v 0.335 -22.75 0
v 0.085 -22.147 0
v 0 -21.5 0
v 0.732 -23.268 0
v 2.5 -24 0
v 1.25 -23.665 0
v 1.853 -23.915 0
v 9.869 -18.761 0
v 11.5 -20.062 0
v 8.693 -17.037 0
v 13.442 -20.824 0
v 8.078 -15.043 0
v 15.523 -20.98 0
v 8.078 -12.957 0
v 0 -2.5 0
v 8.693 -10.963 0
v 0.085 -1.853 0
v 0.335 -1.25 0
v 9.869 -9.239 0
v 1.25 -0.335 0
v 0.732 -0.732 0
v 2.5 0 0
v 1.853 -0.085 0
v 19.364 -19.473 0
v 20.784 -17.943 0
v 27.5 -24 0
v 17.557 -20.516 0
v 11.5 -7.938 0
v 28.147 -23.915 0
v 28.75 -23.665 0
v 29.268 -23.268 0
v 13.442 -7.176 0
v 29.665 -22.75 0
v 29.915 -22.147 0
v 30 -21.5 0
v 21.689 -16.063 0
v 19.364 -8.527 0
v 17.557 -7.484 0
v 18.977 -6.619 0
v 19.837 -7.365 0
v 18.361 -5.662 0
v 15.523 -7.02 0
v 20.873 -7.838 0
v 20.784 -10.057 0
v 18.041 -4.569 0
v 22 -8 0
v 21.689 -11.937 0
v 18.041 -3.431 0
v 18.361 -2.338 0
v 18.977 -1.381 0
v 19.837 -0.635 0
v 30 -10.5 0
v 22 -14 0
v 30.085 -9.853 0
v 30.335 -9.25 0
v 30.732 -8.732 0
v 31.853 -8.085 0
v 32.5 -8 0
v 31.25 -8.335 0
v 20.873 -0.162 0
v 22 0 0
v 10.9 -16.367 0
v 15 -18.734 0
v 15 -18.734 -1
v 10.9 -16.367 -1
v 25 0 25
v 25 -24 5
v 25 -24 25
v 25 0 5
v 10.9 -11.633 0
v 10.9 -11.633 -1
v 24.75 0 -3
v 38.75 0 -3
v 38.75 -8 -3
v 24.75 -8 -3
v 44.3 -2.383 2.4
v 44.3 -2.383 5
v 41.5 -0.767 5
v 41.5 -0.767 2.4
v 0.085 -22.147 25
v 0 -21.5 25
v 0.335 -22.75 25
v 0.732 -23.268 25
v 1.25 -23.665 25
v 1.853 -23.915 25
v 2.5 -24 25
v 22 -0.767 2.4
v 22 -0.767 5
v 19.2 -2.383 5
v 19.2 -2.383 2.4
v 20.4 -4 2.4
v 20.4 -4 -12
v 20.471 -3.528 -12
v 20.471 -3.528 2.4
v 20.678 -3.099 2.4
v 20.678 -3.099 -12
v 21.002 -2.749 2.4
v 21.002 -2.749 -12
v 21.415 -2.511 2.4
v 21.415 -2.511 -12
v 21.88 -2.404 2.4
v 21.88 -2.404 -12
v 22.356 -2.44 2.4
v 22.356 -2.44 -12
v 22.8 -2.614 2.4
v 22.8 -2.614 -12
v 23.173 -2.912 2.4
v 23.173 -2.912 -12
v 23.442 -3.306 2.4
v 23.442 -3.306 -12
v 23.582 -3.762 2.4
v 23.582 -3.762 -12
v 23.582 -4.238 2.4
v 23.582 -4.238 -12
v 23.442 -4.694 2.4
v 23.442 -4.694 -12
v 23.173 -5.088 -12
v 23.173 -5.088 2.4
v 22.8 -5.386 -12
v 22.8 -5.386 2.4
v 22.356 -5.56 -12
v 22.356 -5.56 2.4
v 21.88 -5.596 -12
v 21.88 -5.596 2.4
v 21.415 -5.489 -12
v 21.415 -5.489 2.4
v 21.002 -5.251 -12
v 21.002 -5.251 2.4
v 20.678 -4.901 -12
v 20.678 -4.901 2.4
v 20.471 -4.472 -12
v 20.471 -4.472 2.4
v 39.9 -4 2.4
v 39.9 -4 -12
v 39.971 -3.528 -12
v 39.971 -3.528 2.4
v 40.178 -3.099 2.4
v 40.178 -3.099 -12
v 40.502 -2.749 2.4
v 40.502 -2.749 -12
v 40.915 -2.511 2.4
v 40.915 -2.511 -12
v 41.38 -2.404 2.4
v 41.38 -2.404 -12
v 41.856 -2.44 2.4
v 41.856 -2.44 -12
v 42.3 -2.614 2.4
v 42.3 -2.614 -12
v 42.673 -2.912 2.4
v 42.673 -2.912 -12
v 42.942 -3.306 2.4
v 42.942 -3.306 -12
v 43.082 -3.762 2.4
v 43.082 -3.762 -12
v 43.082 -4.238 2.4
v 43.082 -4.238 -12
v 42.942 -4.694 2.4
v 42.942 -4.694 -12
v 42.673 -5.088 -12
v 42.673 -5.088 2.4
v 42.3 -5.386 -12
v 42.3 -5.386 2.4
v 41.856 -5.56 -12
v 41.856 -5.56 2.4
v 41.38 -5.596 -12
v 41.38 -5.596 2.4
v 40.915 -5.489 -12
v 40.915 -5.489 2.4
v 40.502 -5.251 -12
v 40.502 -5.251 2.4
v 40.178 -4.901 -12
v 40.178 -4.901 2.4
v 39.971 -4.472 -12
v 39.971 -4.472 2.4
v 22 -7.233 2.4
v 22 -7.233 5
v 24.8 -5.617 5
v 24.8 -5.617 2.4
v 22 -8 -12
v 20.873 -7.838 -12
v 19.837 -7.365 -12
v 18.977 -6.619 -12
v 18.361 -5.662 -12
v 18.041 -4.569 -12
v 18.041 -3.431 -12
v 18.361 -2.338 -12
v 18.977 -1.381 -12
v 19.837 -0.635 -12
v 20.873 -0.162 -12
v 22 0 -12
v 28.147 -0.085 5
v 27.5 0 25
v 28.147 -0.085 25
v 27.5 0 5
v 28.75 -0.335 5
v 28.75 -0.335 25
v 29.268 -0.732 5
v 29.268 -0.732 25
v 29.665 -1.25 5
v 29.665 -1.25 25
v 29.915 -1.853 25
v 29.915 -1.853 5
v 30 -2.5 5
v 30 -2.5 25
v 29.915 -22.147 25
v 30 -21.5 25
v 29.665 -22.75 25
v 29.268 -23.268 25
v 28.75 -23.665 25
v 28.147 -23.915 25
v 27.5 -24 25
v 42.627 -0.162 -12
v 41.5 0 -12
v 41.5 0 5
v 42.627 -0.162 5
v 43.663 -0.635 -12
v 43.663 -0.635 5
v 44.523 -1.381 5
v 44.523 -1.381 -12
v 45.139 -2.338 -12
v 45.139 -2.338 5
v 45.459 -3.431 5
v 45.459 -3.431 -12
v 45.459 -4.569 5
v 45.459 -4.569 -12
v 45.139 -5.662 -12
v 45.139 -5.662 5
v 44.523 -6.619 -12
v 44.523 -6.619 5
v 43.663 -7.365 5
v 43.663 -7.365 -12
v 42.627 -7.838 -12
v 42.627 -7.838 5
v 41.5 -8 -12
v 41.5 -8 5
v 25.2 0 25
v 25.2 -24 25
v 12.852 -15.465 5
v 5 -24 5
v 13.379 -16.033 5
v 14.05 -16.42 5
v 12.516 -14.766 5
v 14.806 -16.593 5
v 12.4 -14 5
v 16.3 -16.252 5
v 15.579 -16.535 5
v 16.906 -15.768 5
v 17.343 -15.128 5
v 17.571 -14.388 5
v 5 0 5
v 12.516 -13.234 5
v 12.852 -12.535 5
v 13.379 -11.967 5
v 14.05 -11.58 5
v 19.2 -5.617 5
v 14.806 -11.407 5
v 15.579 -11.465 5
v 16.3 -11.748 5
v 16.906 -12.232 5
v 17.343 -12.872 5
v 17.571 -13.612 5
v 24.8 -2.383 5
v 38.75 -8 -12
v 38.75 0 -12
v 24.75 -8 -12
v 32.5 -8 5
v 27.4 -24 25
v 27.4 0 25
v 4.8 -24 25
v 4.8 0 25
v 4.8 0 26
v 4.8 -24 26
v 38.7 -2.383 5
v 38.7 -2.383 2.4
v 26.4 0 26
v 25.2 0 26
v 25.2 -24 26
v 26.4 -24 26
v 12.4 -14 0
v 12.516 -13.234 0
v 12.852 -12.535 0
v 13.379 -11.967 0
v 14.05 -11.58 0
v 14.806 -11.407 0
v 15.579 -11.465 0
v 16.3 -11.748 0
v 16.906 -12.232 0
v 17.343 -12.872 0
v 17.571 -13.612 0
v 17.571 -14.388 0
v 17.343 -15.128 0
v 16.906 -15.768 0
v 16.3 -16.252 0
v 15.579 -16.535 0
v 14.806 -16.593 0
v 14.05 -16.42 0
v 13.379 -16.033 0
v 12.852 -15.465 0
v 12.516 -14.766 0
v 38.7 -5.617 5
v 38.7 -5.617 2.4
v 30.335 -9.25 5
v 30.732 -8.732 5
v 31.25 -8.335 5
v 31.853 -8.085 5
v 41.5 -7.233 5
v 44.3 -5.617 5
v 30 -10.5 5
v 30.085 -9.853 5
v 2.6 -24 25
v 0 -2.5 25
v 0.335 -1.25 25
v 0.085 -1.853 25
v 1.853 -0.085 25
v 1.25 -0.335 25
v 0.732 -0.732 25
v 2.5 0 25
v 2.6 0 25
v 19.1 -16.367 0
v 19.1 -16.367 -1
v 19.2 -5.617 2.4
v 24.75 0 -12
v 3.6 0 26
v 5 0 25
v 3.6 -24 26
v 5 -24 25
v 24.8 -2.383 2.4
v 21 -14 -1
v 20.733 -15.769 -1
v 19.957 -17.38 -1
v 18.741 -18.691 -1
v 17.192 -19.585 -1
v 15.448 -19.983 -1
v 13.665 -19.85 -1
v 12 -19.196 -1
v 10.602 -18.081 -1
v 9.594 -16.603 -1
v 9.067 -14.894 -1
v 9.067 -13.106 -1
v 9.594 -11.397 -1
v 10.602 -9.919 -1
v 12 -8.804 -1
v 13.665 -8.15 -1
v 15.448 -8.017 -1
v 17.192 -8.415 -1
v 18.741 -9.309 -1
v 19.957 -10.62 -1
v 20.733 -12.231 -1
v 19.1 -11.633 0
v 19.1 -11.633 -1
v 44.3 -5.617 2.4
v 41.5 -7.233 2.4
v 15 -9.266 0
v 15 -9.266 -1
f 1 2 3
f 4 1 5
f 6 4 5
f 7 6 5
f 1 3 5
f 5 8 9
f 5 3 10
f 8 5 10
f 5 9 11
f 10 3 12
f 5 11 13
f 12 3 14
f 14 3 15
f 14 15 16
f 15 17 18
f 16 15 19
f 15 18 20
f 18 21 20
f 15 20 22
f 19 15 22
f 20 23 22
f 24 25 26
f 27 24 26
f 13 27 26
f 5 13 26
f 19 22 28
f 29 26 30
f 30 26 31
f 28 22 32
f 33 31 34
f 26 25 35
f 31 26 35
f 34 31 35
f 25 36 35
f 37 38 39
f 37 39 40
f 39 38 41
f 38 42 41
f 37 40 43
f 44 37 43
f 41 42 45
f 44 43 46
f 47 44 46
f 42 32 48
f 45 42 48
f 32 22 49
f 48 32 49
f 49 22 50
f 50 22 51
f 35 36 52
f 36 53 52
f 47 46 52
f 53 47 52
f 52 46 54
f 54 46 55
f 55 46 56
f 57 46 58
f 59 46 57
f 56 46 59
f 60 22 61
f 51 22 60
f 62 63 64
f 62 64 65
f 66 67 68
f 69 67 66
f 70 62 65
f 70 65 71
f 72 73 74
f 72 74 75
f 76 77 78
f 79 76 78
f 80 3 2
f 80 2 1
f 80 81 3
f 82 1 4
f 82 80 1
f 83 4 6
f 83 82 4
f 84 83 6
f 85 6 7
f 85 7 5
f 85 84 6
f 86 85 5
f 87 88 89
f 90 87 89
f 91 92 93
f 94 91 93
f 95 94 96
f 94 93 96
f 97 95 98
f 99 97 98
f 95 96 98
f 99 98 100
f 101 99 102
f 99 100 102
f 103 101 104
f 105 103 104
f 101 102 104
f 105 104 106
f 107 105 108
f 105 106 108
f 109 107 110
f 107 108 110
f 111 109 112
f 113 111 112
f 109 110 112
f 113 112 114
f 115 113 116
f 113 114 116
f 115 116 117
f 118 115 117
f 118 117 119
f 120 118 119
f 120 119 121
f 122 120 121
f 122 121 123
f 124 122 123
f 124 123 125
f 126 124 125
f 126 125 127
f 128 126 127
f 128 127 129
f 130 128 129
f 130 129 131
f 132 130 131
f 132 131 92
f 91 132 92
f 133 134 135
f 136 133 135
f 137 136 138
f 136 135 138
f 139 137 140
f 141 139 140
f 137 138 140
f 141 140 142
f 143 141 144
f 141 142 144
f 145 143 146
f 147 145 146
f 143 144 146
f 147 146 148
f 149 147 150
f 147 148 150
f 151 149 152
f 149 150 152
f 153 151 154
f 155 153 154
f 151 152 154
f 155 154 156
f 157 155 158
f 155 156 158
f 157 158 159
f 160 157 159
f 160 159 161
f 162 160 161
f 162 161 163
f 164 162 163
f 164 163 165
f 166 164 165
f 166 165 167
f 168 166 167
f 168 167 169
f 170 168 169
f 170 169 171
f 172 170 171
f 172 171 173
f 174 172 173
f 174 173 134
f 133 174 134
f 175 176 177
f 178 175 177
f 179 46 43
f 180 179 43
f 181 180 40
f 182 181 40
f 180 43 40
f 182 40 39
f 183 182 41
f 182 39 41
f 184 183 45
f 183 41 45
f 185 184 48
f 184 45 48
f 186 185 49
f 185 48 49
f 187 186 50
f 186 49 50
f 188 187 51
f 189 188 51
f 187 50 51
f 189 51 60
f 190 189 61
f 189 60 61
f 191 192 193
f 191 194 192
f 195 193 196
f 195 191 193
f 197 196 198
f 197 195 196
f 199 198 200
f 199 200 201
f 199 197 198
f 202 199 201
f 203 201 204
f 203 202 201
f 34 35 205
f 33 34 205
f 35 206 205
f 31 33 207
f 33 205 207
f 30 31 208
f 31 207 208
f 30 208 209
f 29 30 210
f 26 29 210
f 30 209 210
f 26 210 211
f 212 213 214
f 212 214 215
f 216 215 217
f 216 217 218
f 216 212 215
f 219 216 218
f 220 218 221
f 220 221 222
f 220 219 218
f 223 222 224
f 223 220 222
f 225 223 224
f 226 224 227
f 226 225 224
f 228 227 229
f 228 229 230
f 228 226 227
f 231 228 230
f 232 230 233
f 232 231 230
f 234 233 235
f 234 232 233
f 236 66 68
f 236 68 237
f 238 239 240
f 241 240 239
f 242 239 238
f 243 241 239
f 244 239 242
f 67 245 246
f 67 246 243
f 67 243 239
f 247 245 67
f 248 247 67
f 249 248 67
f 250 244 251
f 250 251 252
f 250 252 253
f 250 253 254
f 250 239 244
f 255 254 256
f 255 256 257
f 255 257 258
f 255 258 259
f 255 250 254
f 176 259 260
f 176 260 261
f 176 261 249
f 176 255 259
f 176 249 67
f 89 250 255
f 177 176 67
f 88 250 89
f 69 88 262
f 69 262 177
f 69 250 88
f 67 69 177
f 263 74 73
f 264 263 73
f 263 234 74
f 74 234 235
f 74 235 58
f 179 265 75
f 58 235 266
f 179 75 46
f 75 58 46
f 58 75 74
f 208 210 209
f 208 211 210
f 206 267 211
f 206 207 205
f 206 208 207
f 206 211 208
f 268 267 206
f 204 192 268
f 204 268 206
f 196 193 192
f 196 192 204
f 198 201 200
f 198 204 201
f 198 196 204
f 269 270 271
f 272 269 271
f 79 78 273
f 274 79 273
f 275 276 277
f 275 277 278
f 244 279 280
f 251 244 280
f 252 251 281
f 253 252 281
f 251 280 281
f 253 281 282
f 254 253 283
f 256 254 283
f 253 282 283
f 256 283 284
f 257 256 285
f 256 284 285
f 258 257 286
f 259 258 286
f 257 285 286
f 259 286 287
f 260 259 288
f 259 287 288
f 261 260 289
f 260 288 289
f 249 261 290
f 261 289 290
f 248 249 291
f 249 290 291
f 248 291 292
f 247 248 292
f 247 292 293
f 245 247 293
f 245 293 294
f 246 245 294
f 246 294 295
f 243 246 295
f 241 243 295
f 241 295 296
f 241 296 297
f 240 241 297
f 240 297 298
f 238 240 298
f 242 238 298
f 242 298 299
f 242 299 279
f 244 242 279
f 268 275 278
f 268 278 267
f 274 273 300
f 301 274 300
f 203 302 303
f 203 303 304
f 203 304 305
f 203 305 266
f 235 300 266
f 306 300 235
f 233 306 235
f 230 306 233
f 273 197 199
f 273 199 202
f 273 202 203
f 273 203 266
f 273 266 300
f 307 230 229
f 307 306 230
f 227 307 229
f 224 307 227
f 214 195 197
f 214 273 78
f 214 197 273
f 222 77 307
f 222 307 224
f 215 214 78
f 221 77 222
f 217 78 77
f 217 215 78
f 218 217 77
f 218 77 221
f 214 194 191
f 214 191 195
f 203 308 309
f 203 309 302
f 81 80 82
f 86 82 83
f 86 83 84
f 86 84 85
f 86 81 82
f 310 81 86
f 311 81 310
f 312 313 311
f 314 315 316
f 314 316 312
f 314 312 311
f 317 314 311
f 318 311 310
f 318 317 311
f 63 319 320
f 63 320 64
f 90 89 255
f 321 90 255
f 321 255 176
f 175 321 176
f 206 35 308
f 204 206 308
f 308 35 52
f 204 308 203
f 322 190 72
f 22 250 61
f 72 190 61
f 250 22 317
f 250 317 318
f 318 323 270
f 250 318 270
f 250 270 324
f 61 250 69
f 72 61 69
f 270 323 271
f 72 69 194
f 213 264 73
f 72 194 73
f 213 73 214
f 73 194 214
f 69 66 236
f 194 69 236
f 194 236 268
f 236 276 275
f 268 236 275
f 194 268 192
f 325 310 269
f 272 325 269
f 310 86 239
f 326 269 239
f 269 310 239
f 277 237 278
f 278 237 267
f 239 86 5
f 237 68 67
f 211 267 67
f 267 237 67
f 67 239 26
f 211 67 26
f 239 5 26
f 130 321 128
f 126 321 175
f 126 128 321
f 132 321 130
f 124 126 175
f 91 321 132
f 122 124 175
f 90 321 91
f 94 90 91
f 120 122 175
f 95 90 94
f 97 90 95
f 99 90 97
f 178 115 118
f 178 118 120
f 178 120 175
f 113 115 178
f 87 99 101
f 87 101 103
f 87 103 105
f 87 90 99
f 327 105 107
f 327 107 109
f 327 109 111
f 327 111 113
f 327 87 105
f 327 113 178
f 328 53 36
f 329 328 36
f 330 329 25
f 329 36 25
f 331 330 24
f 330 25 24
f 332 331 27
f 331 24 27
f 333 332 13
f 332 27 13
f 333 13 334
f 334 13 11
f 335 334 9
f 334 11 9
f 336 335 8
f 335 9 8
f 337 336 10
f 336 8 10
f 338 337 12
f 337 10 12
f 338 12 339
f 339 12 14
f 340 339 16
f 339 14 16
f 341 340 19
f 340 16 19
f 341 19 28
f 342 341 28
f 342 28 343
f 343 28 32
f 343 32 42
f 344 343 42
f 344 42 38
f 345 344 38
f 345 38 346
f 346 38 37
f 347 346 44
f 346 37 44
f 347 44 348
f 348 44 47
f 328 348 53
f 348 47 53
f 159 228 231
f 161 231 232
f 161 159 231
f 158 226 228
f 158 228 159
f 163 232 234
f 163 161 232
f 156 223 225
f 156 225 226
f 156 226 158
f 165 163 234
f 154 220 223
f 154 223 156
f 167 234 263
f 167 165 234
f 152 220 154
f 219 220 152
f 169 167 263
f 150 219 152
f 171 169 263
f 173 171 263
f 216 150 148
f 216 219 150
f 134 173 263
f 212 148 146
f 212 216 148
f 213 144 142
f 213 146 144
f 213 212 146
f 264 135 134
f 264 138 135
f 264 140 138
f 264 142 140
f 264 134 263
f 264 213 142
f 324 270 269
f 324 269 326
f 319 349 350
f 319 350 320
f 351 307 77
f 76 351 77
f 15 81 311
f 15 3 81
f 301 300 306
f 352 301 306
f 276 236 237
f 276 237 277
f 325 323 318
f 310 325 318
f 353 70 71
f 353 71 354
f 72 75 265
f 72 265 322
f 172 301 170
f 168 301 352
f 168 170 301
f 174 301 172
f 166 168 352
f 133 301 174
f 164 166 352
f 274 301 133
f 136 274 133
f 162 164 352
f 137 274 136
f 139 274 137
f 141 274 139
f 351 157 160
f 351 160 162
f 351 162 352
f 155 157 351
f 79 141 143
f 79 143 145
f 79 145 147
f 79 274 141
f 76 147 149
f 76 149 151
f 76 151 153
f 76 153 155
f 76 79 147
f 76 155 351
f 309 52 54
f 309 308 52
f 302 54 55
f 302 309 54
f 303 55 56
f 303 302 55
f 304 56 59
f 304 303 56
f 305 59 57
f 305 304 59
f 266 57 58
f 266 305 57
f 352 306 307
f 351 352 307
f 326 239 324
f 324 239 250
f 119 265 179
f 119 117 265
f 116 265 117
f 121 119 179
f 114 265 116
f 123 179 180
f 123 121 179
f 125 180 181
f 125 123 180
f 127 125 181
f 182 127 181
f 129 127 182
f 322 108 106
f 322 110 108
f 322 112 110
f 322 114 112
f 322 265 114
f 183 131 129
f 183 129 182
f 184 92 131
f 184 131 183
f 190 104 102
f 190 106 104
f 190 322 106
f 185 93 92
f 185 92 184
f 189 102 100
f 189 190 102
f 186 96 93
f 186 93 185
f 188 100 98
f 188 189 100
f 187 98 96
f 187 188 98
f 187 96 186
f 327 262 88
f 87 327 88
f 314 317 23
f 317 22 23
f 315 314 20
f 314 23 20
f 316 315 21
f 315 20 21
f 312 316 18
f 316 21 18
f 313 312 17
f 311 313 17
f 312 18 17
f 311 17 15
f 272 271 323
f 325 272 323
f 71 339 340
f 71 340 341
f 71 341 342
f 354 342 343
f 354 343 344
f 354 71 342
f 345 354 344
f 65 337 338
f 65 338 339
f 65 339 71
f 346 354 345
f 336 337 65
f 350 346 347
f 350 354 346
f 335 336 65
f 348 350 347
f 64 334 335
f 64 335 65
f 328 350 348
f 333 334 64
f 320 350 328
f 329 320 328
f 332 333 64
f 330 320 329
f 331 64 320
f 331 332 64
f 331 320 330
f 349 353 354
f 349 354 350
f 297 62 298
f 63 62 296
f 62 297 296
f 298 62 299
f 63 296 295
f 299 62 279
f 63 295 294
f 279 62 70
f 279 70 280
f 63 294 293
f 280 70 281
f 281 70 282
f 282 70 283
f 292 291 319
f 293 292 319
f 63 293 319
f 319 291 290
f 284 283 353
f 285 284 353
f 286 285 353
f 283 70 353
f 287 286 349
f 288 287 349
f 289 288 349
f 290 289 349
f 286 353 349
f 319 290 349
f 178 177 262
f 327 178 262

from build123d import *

# Parameters (mm, degrees)
SKETCH_1_W                  = 30
SKETCH_1_H                  = 24
EXTRUDE_1_DEPTH             = 5
SKETCH_2_W                  = 5
SKETCH_2_H                  = 24
EXTRUDE_2_DEPTH             = 20
EXTRUDE_3_DEPTH             = 24
SKETCH_4_R                  = 2.6
CUT_EXTRUDE_1_DEPTH         = 47.389654019
EXTRUDE_4_DEPTH             = 12
EXTRUDE_4_DIRECTION_2_REACH = 48.39
SKETCH_6_W                  = 14
SKETCH_6_H                  = 8
CUT_EXTRUDE_2_DEPTH         = 9
SKETCH_7_R                  = 1.6
CUT_EXTRUDE_3_DEPTH         = 64.955062348
CUT_EXTRUDE_4_DEPTH         = 2.6
SKETCH_10_R                 = 6
EXTRUDE_5_DEPTH             = 1
FILLET_1_R                  = 2.5
FILLET_2_R                  = 2.5
CHAMFER_1_SIZE              = 1


with BuildPart() as part:
    # Эскиз1 → Бобышка-Вытянуть1 (new body)
    with BuildSketch(Plane.XY):
        with Locations((15, -12)):
            Rectangle(SKETCH_1_W, SKETCH_1_H)
    extrude(amount=EXTRUDE_1_DEPTH)

    # Эскиз2 → Бобышка-Вытянуть2 (add)
    with BuildSketch(Plane.XY.offset(5)):
        with Locations((2.5, -12)):
            Rectangle(SKETCH_2_W, SKETCH_2_H)
        with Locations((27.5, -12)):
            Rectangle(SKETCH_2_W, SKETCH_2_H)
    extrude(amount=EXTRUDE_2_DEPTH)

    # Эскиз3 → Бобышка-Вытянуть3 (add)
    with BuildSketch(Plane(origin=(0, 0, 0), x_dir=(1, 0, 0), z_dir=(0, 1, 0))):
        Polygon((25.2, -25), (25.2, -26), (26.4, -26), (27.4, -25), align=None)
        Polygon((4.8, -25), (4.8, -26), (3.6, -26), (2.6, -25), align=None)
    extrude(amount=-EXTRUDE_3_DEPTH)

    # Эскиз4 → Вырез-Вытянуть1 (cut, through all)
    with BuildSketch(Plane(origin=(0, 0, 0), x_dir=(-1, 0, 0), z_dir=(0, 0, -1))):
        with Locations((-15, -14)):
            Circle(SKETCH_4_R)
    extrude(amount=-CUT_EXTRUDE_1_DEPTH, mode=Mode.SUBTRACT)

    # Эскиз5 → Бобышка-Вытянуть4 (add)
    with BuildSketch(Plane(origin=(0, 0, 0), x_dir=(-1, 0, 0), z_dir=(0, 0, -1))):
        with BuildLine():
            Line((-22, 0), (-41.5, 0))
            ThreePointArc((-41.5, 0), (-45.5, -4), (-41.5, -8))
            Line((-41.5, -8), (-22, -8))
            ThreePointArc((-22, -8), (-18, -4), (-22, 0))
        make_face()
    extrude(amount=EXTRUDE_4_DEPTH)

    # Бобышка-Вытянуть4 direction 2: up to this face of the body (flat: up to its plane)
    extrude_4_direction_2_end = Plane(part.part.faces().sort_by_distance((5.312409987, -12, 5))[0])
    # Эскиз5 → Бобышка-Вытянуть4 direction 2 (add, up to the picked face)
    with BuildSketch(Plane(origin=(0, 0, 0), x_dir=(-1, 0, 0), z_dir=(0, 0, -1)), mode=Mode.PRIVATE) as extrude_4_direction_2_sk1:
        with BuildLine():
            Line((-22, 0), (-41.5, 0))
            ThreePointArc((-41.5, 0), (-45.5, -4), (-41.5, -8))
            Line((-41.5, -8), (-22, -8))
            ThreePointArc((-22, -8), (-18, -4), (-22, 0))
        make_face()
    extrude_4_direction_2_tool1 = split(extrude(extrude_4_direction_2_sk1.sketch, amount=-EXTRUDE_4_DIRECTION_2_REACH, mode=Mode.PRIVATE), bisect_by=extrude_4_direction_2_end, keep=Keep.BOTH, mode=Mode.PRIVATE)
    add(extrude_4_direction_2_tool1.solids().sort_by(Axis((31.75, -4, 0), (0, 0, 1)))[0])

    # Эскиз6 → Вырез-Вытянуть2 (cut)
    with BuildSketch(Plane(origin=(0, 0, -12), x_dir=(-1, 0, 0), z_dir=(0, 0, -1))):
        with Locations((-31.75, -4)):
            Rectangle(SKETCH_6_W, SKETCH_6_H)
    extrude(amount=-CUT_EXTRUDE_2_DEPTH, mode=Mode.SUBTRACT)

    # Эскиз7 → Вырез-Вытянуть3 (cut, through all)
    with BuildSketch(Plane(origin=(0, 0, -12), x_dir=(-1, 0, 0), z_dir=(0, 0, -1))):
        with Locations((-22, -4)):
            Circle(SKETCH_7_R)
        with Locations((-41.5, -4)):
            Circle(SKETCH_7_R)
    extrude(amount=-CUT_EXTRUDE_3_DEPTH, mode=Mode.SUBTRACT)

    # Эскиз8 → Вырез-Вытянуть4 (cut)
    with BuildSketch(Plane.XY.offset(5)):
        Polygon((41.5, -0.766838493), (38.7, -2.383419246), (38.7, -5.616580754), (41.5, -7.233161507), (44.3, -5.616580754), (44.3, -2.383419246), align=None)
        Polygon((22, -0.766838493), (19.2, -2.383419246), (19.2, -5.616580754), (22, -7.233161507), (24.8, -5.616580754), (24.8, -2.383419246), align=None)
    extrude(amount=-CUT_EXTRUDE_4_DEPTH, mode=Mode.SUBTRACT)

    # Эскиз10 → Бобышка-Вытянуть5 (add)
    with BuildSketch(Plane(origin=(0, 0, 0), x_dir=(-1, 0, 0), z_dir=(0, 0, -1))):
        with Locations(Location((-15, -14, 0), (0, 0, 180))):
            Circle(SKETCH_10_R)
        Polygon((-15, -18.734272207), (-10.9, -16.367136104), (-10.9, -11.632863896), (-15, -9.265727793), (-19.1, -11.632863896), (-19.1, -16.367136104), align=None, mode=Mode.SUBTRACT)
    extrude(amount=EXTRUDE_5_DEPTH)

    # Скругление1
    fillet_1_edges = [part.edges().sort_by_distance(p)[0] for p in [
        (0, 0, 12.5),
        (30, 0, 15),
        (30, -24, 12.5),
        (0, -24, 12.5),
    ]]
    fillet(fillet_1_edges, radius=FILLET_1_R)

    # Скругление2
    fillet_2_edges = [part.edges().sort_by_distance(p)[0] for p in [
        (30, -8, 2.5),
    ]]
    fillet(fillet_2_edges, radius=FILLET_2_R)

    # Фаска1
    chamfer_1_edges = [part.edges().sort_by_distance(p)[0] for p in [
        (9, -14, 0),
    ]]
    chamfer(chamfer_1_edges, length=CHAMFER_1_SIZE - 0.0001)  # a hair under: the kernel refuses the full size


solid = part.part
